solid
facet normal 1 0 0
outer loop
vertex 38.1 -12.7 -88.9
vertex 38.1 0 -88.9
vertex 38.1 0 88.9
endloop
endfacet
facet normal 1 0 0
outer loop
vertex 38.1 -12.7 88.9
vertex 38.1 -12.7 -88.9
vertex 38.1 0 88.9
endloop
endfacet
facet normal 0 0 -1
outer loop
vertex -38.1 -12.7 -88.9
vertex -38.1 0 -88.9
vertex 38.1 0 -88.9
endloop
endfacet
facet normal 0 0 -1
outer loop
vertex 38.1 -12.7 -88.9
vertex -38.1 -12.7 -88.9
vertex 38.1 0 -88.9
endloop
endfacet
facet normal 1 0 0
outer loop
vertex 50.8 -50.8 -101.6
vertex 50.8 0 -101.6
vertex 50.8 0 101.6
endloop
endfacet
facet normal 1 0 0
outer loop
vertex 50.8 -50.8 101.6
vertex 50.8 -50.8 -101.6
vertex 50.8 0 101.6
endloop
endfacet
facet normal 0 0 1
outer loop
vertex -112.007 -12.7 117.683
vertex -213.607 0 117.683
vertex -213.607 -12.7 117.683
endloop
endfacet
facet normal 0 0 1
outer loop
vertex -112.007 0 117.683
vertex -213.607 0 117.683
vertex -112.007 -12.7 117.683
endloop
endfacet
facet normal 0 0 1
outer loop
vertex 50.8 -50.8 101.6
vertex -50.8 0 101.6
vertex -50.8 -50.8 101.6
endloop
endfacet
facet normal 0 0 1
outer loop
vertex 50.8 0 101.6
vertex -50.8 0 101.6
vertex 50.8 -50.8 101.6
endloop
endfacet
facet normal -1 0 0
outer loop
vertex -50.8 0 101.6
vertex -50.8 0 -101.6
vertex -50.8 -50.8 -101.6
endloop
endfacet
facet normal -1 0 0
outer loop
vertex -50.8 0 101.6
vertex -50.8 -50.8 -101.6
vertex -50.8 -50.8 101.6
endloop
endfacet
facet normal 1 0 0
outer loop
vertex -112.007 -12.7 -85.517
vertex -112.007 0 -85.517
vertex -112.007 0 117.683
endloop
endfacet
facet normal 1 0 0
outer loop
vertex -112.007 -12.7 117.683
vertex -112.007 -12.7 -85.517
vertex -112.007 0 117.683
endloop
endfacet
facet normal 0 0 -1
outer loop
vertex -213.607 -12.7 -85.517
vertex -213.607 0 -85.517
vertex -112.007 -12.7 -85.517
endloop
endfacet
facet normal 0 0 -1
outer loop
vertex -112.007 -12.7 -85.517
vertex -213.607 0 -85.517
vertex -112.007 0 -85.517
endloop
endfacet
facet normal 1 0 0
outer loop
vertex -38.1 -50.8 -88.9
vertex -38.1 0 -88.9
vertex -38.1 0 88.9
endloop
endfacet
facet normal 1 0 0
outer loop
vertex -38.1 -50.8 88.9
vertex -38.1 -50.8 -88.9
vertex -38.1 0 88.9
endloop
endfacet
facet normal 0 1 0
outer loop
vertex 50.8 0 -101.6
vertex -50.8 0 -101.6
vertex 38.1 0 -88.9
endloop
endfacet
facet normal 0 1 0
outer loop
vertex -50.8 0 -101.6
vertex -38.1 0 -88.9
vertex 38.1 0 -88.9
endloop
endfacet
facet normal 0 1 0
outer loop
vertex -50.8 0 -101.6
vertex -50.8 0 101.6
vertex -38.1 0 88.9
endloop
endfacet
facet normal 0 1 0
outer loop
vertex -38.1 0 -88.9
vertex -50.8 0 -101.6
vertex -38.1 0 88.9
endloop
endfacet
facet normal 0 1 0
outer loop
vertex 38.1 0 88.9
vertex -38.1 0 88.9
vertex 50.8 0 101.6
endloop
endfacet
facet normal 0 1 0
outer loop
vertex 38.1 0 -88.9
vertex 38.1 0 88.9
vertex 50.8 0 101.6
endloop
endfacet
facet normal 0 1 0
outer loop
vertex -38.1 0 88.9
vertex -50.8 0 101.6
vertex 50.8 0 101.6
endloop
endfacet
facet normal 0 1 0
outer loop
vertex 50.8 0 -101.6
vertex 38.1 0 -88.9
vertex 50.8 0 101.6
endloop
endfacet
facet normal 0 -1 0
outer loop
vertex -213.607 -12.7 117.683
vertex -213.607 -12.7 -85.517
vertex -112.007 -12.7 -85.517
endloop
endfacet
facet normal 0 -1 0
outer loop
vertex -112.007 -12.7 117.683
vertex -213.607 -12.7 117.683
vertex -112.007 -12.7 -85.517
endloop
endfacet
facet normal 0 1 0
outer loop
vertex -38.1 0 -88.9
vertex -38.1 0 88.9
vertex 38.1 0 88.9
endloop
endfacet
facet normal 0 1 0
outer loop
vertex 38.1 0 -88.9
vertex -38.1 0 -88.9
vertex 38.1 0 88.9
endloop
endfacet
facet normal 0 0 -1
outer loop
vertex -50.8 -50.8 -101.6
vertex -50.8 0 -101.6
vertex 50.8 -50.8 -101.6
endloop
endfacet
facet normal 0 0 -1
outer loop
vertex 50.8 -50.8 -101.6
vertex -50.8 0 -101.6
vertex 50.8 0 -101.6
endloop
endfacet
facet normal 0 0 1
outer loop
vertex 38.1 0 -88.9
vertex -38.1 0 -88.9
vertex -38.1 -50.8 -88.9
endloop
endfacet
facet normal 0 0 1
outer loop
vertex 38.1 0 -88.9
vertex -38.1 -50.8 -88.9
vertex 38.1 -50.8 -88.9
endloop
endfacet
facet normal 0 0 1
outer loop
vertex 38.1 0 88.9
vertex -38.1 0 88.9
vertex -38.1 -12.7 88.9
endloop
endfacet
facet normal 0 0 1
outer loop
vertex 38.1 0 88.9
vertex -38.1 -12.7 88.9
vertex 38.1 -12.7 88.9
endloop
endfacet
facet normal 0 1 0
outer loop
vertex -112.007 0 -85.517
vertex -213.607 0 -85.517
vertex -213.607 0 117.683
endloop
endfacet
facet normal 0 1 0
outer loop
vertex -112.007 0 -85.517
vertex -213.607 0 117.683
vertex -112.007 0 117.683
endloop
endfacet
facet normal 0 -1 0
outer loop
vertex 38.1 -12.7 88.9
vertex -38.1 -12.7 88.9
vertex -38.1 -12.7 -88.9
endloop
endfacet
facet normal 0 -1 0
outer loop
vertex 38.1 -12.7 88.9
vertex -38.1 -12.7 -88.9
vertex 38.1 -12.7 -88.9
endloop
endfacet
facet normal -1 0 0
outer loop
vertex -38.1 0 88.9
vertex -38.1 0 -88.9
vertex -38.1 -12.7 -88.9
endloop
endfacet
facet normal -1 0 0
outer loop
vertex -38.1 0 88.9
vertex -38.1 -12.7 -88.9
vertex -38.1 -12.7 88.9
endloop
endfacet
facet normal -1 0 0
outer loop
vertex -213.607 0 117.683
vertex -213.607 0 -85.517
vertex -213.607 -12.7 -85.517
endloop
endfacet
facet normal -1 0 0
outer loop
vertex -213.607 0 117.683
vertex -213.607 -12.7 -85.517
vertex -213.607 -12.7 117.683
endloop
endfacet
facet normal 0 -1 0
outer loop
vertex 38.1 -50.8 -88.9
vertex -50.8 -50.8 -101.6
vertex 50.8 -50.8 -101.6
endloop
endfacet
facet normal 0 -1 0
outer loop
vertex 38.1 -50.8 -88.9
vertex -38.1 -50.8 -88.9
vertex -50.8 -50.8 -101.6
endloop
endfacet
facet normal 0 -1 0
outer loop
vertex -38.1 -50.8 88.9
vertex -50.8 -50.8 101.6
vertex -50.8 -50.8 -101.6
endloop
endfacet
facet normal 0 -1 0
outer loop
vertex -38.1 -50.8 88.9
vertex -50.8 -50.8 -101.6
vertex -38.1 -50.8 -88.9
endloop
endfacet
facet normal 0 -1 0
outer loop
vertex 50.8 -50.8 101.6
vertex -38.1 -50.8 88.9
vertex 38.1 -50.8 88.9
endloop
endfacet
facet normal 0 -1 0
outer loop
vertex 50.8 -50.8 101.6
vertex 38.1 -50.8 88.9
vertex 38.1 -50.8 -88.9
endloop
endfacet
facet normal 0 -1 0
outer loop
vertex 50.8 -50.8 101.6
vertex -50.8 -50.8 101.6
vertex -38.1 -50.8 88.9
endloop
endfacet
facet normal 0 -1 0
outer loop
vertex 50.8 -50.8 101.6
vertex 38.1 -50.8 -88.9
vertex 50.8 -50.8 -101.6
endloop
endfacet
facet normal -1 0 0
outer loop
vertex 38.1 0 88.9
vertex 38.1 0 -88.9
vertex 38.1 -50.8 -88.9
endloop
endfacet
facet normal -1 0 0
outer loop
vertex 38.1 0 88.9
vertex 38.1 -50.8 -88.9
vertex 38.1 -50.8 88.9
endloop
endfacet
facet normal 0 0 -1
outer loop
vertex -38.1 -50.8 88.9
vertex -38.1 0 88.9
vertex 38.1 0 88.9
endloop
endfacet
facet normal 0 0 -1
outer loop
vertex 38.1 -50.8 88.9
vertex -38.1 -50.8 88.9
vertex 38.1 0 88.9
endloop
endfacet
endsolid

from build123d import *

# Parameters (mm, degrees)
F0_W     = 101.6
F0_H     = 203.2
F0_W_2   = 76.2
F0_H_2   = 177.8
F1_DEPTH = 50.8
F2_DEPTH = 12.7
F3_DEPTH = 12.7


with BuildPart() as f1:
    # F0 (on Front) → F1 (new body)
    with BuildSketch(Plane.XZ):
        Rectangle(F0_W, F0_H)
        Rectangle(F0_W_2, F0_H_2, mode=Mode.SUBTRACT)
    extrude(amount=F1_DEPTH)


with BuildPart() as f2:
    # F0 (on Front) → F2 (new body)
    with BuildSketch(Plane.XZ):
        Rectangle(F0_W_2, F0_H_2)
    extrude(amount=F2_DEPTH)


with BuildPart() as f3:
    # F0 (on Front) → F3 (new body)
    with BuildSketch(Plane.XZ):
        with Locations((-162.807311, 16.082685)):
            Rectangle(F0_W, F0_H)
    extrude(amount=F3_DEPTH)


solid = Compound([f1.part, f2.part, f3.part])
